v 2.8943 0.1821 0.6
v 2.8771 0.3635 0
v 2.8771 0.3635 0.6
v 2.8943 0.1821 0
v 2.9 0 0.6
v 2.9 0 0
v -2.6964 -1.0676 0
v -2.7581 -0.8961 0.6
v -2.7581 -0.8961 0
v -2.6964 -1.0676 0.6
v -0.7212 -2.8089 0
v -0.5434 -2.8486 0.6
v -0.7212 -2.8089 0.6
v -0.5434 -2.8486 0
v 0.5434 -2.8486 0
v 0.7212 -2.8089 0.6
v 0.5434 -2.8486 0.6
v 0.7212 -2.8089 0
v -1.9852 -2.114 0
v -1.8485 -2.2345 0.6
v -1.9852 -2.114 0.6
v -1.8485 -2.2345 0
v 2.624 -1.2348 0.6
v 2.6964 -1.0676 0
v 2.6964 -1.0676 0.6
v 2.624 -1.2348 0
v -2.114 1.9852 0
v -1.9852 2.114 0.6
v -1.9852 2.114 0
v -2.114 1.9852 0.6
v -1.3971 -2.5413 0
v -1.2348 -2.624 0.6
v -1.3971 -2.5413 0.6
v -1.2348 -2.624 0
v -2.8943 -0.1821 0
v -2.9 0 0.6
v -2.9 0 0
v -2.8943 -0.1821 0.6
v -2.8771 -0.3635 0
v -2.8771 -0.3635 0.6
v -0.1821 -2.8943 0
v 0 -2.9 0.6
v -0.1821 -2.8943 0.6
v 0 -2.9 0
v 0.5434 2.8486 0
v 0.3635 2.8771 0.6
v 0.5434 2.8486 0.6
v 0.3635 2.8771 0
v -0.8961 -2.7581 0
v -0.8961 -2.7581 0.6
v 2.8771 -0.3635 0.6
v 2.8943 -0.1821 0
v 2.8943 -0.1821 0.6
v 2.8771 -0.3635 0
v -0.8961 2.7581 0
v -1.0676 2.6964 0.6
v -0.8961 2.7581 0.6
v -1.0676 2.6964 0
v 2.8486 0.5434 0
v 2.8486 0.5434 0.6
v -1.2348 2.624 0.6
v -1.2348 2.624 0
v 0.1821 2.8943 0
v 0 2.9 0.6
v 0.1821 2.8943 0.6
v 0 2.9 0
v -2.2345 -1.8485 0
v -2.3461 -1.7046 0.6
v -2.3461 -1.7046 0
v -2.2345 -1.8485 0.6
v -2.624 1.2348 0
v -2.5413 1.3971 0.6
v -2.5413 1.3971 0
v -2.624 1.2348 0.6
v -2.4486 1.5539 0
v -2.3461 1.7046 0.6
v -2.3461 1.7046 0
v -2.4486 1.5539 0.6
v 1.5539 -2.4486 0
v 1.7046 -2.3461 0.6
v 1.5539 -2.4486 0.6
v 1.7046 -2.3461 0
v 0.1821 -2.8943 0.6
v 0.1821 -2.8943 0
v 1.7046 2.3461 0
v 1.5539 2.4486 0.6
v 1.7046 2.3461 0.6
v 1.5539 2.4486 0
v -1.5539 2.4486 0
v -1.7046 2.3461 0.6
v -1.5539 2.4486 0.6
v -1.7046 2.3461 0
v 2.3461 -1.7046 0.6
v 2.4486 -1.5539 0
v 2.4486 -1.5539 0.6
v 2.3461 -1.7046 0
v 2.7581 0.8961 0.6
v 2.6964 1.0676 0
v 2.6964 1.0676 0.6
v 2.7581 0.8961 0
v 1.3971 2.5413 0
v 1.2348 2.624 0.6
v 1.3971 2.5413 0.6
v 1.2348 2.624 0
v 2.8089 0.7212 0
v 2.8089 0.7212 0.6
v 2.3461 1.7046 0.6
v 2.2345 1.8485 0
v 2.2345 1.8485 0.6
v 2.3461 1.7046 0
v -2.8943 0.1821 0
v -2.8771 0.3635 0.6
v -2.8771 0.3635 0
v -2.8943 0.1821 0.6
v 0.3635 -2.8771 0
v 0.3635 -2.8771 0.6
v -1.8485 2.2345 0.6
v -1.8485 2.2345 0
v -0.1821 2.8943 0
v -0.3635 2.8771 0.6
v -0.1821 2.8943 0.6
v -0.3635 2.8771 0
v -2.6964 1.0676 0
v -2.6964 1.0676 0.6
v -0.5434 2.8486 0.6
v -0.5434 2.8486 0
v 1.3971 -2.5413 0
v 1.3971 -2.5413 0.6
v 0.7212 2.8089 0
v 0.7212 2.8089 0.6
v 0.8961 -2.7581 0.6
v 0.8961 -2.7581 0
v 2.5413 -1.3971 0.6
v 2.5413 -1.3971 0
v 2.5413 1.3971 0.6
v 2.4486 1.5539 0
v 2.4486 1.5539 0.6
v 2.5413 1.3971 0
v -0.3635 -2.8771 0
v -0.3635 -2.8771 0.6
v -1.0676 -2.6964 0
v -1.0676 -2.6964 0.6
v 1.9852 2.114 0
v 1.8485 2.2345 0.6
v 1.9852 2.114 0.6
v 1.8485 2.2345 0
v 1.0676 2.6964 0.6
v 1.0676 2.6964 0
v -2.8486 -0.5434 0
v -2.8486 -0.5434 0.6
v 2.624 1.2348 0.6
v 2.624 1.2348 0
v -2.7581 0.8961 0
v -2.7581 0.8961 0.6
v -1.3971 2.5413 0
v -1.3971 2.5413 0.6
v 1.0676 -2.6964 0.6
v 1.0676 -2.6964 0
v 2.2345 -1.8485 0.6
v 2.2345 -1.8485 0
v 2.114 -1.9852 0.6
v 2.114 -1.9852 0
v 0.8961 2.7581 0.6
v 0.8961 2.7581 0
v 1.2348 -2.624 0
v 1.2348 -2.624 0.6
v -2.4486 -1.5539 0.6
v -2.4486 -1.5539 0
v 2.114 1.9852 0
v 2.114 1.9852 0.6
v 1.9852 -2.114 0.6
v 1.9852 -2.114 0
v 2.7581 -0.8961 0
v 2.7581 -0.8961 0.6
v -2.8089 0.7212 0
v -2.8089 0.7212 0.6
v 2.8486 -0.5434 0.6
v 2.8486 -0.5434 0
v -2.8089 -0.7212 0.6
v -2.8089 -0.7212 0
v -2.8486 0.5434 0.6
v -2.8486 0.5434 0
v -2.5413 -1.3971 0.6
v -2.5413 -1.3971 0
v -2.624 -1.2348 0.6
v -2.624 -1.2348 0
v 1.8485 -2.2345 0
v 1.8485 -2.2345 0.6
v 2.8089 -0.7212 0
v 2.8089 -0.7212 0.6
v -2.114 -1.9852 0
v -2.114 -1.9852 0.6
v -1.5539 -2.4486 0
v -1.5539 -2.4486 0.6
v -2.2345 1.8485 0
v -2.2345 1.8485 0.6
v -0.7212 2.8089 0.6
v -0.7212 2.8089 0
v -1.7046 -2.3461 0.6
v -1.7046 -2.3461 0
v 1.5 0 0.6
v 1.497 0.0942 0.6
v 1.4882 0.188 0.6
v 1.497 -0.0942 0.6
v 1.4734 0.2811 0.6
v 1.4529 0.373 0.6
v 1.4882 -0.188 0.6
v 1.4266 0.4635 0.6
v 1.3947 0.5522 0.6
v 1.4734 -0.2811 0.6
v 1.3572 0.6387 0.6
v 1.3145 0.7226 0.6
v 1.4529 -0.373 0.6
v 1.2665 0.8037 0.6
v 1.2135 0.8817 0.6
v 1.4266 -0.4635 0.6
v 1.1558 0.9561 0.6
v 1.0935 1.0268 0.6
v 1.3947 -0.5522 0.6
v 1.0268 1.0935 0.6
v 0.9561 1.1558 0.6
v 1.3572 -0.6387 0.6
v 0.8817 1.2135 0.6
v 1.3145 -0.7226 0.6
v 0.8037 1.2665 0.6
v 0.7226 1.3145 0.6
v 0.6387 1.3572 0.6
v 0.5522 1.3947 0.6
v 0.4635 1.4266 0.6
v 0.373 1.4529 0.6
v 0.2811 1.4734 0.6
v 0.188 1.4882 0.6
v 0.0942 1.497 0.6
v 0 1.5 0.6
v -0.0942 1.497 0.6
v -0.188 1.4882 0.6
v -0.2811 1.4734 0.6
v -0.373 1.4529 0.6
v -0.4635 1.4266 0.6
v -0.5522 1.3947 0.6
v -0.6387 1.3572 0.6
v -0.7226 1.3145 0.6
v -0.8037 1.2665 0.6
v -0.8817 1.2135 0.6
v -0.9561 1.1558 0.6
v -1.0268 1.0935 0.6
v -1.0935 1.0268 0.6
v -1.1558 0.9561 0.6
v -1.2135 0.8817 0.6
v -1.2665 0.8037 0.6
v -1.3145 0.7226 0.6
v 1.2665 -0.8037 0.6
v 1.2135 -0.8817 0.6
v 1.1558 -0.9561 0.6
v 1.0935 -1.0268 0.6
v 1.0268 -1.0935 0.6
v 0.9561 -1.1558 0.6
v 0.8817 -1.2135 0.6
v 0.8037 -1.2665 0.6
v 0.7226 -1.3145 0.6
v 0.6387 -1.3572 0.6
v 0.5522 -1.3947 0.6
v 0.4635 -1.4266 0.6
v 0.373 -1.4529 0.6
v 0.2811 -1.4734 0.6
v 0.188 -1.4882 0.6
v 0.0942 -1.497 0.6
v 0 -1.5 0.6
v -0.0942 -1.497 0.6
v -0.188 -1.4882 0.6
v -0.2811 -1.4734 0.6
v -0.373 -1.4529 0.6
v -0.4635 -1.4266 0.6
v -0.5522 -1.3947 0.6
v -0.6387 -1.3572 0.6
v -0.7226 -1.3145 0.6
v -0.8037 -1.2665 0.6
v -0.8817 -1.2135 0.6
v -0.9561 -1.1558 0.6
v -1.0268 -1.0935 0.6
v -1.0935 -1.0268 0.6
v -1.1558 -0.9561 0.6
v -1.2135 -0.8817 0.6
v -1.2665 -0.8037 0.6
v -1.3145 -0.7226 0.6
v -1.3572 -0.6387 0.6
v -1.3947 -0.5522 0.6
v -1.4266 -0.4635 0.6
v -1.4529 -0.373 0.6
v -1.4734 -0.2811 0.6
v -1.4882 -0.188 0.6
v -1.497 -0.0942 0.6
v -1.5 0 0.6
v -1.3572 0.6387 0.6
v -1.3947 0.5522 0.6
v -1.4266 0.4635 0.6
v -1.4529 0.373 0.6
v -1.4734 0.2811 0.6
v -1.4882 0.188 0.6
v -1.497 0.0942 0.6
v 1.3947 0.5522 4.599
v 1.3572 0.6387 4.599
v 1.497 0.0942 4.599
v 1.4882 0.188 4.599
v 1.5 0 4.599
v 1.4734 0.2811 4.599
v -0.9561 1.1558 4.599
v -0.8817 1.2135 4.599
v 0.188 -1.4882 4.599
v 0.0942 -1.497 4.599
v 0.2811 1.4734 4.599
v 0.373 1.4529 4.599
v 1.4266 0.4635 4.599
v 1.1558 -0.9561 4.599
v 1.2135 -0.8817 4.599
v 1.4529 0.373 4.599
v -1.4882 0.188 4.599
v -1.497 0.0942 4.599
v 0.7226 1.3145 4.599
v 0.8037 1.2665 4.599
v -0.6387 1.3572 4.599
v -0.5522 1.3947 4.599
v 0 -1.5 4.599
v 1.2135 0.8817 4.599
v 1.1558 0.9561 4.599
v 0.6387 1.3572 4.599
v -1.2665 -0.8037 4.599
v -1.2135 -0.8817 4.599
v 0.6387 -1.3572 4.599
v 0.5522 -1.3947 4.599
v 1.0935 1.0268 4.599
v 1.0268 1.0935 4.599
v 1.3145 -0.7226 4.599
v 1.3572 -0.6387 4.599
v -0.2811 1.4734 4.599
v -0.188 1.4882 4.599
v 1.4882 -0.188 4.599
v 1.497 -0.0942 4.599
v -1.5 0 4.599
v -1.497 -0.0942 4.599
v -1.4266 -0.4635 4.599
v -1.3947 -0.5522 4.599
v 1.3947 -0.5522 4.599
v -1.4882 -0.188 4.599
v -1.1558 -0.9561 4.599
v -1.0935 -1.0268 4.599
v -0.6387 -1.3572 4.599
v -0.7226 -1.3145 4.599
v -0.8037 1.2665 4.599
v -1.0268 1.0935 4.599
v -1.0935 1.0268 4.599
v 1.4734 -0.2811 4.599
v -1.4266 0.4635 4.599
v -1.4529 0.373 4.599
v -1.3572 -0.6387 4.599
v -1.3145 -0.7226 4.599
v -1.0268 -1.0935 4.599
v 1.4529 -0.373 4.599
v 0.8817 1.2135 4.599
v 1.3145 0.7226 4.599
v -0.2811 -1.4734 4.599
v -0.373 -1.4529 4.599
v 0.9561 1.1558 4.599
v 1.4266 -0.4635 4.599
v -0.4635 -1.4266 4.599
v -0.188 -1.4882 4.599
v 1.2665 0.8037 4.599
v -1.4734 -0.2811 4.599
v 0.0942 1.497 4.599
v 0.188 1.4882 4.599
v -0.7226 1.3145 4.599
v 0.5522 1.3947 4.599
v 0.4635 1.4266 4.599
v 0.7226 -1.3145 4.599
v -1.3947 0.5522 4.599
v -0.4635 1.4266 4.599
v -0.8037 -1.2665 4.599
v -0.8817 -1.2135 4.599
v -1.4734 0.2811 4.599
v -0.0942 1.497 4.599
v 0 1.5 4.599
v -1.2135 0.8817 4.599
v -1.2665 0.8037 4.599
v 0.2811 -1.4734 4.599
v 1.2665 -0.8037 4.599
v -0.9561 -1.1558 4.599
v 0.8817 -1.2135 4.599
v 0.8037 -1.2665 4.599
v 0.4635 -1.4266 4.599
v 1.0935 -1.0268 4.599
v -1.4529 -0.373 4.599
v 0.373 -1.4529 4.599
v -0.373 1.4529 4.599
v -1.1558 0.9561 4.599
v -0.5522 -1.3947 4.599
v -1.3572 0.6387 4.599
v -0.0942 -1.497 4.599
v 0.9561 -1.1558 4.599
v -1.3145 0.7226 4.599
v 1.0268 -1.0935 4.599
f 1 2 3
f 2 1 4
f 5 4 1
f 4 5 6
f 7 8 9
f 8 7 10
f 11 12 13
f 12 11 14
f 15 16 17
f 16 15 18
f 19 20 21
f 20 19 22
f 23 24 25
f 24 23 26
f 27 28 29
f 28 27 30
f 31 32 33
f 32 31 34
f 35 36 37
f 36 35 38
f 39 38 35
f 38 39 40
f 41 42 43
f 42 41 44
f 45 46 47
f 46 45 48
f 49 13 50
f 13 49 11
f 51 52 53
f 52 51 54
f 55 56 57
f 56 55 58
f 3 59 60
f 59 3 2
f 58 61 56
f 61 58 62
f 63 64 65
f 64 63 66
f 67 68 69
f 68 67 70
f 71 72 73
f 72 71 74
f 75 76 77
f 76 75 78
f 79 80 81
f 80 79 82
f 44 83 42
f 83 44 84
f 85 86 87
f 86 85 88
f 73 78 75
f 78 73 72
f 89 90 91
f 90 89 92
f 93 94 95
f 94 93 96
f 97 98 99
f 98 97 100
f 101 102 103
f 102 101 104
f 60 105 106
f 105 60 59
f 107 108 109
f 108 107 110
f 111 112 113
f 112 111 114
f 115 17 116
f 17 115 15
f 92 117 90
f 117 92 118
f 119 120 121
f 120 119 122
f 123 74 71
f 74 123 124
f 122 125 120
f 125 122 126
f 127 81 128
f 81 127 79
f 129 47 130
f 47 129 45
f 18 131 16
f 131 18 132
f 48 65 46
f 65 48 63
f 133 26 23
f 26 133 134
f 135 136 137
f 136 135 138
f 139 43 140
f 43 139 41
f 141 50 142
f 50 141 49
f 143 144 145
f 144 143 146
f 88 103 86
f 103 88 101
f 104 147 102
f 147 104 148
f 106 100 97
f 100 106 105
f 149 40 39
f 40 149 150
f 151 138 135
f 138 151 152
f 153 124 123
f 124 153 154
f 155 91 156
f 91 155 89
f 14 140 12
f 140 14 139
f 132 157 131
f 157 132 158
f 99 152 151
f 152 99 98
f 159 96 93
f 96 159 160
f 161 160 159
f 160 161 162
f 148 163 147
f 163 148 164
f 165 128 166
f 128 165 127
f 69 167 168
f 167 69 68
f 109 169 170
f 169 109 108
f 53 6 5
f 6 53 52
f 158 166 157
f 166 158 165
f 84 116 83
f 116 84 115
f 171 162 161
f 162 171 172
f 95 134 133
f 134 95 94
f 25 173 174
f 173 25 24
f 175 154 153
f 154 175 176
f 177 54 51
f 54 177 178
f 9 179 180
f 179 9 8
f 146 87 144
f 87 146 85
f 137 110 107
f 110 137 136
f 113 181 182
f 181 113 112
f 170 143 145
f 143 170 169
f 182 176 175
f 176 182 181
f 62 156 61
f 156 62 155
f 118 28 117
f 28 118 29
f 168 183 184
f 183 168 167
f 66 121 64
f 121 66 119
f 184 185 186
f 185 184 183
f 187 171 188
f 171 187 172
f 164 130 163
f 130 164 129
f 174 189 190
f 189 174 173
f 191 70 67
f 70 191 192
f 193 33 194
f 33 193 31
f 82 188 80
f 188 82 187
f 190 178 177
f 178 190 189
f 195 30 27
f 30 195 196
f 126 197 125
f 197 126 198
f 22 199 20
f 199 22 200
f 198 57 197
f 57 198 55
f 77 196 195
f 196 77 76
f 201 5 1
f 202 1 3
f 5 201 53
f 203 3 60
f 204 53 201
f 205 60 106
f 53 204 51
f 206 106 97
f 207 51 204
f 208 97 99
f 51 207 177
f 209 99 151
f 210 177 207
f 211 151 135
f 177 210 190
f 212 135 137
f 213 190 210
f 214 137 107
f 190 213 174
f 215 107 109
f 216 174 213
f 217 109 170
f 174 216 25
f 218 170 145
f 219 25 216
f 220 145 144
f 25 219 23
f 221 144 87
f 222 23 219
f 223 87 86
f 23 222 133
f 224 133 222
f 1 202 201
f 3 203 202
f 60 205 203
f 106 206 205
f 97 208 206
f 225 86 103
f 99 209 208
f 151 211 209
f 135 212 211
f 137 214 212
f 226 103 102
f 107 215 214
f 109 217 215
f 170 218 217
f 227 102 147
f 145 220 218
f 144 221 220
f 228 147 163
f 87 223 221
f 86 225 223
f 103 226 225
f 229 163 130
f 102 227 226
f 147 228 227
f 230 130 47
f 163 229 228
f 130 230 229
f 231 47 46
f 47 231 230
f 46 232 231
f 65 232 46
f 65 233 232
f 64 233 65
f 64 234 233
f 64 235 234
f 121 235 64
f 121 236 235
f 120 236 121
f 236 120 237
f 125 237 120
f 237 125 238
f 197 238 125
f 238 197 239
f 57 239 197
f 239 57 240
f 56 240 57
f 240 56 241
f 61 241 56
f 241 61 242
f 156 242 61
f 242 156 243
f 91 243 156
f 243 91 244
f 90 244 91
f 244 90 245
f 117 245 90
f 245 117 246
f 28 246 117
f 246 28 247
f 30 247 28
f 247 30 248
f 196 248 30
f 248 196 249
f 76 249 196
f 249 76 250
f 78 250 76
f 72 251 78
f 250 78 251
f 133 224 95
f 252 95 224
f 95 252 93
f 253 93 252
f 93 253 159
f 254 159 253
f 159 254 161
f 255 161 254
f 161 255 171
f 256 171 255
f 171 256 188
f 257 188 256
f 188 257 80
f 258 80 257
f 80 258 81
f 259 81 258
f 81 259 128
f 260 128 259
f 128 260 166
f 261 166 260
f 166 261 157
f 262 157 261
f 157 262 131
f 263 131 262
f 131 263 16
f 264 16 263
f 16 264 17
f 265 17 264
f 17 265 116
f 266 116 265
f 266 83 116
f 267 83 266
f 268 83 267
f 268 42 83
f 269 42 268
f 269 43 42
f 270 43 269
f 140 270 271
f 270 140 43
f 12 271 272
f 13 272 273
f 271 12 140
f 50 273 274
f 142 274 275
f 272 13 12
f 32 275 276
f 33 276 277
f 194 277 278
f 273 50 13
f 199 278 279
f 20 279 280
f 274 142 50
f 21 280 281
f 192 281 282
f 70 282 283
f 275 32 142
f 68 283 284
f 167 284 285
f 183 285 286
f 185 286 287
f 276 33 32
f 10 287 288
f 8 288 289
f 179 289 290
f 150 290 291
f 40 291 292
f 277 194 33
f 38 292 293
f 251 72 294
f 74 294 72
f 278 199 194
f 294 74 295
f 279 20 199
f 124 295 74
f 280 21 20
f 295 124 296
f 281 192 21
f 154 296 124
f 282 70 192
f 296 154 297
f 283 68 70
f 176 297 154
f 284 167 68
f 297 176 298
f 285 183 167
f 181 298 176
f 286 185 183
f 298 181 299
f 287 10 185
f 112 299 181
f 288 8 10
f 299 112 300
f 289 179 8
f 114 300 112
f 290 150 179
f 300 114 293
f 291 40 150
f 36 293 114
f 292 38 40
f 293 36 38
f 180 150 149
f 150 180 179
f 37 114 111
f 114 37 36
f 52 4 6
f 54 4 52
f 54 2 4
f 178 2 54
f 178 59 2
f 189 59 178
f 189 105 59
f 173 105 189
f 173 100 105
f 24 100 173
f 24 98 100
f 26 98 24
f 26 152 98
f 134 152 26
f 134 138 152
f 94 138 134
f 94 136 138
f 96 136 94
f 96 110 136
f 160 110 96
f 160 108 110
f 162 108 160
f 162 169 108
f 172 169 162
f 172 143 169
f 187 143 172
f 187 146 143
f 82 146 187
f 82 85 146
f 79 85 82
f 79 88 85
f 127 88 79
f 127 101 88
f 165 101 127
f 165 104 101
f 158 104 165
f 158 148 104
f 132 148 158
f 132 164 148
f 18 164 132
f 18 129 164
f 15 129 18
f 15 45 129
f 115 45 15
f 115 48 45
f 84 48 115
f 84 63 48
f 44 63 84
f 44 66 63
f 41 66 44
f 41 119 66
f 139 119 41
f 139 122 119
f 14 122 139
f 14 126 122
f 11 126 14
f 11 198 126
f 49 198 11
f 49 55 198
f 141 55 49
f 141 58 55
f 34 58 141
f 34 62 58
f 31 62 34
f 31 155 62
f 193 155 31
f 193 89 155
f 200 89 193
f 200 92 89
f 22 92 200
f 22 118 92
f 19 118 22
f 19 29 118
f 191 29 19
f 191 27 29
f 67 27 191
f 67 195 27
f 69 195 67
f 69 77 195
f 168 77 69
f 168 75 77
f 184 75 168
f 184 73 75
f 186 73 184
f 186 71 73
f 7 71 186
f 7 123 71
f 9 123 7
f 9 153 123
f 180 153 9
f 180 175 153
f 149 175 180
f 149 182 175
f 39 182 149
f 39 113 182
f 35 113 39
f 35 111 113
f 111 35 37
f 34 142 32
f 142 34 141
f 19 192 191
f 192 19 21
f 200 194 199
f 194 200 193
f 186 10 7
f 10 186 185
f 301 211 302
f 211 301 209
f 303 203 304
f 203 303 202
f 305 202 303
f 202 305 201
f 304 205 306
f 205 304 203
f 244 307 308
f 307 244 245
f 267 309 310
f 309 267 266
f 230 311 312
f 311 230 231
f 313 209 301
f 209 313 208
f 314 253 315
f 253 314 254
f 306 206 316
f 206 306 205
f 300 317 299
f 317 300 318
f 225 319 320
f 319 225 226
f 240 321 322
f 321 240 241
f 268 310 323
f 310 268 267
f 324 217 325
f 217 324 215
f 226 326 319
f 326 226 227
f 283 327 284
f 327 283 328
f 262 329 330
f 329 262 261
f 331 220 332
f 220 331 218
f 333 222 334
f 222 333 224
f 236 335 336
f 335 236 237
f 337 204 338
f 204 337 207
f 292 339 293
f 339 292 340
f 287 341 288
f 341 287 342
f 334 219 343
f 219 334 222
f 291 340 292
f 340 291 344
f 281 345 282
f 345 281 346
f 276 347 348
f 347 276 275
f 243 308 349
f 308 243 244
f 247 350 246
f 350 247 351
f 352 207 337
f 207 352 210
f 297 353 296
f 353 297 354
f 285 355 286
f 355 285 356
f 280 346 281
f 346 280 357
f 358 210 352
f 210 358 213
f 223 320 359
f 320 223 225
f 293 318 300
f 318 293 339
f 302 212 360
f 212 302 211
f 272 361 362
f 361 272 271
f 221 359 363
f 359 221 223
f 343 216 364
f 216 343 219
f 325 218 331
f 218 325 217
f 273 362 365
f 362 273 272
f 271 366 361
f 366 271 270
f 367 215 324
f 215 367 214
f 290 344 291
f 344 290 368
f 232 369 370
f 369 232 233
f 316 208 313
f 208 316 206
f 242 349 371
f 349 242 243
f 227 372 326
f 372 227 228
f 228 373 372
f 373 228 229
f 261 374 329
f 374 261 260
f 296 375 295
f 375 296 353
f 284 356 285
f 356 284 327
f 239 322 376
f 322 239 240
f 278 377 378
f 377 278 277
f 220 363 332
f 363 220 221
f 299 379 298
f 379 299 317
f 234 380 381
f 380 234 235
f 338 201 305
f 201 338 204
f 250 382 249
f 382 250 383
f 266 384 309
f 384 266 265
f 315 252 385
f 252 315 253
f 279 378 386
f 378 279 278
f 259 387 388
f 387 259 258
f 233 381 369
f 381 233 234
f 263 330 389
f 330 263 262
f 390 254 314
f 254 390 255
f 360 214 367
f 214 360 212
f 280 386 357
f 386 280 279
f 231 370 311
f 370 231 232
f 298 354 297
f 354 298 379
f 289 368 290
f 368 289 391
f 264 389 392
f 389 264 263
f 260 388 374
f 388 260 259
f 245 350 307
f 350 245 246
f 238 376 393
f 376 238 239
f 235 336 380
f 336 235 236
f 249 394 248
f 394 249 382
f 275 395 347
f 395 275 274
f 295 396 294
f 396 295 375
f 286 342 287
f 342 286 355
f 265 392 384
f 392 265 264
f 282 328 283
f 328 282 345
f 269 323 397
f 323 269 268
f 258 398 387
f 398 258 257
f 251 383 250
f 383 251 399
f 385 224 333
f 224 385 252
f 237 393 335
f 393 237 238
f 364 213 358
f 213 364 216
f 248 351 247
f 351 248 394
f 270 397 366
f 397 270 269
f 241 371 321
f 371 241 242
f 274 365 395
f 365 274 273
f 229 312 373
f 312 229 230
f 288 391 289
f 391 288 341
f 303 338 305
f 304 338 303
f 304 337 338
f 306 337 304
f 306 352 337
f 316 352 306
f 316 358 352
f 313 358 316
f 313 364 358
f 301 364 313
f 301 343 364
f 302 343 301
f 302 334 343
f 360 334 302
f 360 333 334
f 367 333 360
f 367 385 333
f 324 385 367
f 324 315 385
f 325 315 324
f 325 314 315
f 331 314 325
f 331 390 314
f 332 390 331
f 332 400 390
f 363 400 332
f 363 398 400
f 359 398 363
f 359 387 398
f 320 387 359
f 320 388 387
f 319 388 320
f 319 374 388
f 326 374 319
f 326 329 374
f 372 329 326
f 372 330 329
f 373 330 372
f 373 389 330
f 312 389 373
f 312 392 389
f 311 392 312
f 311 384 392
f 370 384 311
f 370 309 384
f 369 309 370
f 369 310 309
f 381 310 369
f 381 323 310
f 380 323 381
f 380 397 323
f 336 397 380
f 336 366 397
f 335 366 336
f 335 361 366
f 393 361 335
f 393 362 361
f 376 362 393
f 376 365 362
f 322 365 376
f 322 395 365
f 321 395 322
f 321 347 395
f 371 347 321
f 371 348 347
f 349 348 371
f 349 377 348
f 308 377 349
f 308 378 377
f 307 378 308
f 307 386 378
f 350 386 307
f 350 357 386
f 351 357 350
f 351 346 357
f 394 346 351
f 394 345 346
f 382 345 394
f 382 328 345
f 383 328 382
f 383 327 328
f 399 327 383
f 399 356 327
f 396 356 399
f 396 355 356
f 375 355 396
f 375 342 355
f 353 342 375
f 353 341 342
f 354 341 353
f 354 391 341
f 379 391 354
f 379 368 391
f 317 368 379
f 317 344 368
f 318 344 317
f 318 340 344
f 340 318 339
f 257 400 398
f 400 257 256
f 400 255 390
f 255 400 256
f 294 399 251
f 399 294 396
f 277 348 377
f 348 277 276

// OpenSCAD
$fn = 100;
enclosure_hole_r = 3.4 / 2;
outer_button_r = enclosure_hole_r - 0.2;
inner_button_r = enclosure_hole_r + 1.2;
inner_h = 0.6;
hole_h = inner_h - 0.6;
outer_h = 2; // 3-4 for NMI, 2 for reset
wall_thickness = 2;

cylinder(h = inner_h, r = inner_button_r);
translate([0, 0, inner_h - 0.001]) cylinder(h = outer_h + wall_thickness, r = outer_button_r);
